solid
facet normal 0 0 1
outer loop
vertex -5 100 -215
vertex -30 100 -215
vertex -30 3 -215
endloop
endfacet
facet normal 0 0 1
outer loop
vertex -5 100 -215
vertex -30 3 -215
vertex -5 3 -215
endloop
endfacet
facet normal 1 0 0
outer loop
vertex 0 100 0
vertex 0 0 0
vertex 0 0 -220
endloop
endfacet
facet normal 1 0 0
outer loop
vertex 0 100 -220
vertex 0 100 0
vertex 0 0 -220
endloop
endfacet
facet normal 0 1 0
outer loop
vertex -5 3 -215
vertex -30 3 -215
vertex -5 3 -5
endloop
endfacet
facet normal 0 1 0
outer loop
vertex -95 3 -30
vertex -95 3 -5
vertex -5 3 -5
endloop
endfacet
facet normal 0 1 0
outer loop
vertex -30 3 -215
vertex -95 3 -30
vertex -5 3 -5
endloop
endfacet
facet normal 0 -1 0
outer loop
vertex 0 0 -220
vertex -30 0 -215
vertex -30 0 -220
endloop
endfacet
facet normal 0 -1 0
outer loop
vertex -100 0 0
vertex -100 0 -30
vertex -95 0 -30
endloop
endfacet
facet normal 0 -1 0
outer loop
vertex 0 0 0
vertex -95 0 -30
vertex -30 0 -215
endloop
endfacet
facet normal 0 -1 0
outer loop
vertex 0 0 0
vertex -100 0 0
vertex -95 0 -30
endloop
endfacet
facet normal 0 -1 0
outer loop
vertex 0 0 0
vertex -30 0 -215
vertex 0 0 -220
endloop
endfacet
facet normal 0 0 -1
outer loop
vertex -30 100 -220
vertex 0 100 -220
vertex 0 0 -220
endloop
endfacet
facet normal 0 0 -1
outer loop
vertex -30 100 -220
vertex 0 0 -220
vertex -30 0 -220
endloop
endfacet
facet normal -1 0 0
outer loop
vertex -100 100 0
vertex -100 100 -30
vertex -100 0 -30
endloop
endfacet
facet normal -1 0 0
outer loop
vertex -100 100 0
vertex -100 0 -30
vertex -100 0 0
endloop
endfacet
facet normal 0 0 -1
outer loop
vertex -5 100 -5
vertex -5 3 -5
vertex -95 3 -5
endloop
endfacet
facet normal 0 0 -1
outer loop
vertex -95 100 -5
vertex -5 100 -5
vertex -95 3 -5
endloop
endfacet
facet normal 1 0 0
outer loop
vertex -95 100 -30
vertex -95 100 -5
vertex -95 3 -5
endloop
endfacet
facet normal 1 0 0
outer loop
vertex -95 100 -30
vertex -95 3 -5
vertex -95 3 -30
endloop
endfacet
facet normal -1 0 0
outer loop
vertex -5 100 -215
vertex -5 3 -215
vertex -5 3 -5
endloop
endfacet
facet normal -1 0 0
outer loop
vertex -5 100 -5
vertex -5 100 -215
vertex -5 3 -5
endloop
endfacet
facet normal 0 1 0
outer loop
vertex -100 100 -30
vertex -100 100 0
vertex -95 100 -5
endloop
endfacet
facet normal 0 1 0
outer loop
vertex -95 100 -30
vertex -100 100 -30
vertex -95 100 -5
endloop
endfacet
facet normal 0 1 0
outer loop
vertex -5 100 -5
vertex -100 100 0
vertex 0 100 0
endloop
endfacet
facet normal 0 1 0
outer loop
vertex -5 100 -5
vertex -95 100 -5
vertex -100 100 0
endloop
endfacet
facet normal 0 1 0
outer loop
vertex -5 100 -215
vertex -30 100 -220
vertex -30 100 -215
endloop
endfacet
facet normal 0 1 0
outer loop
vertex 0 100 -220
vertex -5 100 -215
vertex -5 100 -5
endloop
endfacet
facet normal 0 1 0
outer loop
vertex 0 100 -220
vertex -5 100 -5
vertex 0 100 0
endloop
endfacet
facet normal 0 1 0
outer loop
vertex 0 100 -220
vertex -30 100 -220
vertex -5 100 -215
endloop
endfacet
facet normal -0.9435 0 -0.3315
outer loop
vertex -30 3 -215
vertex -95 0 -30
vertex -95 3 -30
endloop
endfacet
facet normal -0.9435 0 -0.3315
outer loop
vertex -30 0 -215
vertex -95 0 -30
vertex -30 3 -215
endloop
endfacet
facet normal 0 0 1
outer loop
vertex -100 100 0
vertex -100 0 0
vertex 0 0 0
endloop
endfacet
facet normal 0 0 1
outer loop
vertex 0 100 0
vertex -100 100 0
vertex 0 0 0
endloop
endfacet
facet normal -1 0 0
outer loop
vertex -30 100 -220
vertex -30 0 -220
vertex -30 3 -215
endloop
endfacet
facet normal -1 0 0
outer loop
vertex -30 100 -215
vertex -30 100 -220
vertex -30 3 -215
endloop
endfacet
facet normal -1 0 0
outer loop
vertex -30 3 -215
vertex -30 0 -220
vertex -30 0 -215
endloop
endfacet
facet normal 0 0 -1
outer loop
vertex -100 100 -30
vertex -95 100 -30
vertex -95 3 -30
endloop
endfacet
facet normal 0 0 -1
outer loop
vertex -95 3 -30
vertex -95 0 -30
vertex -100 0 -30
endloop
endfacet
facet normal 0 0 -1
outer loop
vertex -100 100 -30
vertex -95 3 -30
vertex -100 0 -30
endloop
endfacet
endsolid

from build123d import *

# Parameters (mm, degrees)
ESTRUSIONE_ESTRUSIONE1_DEPTH = 100
ESTRUSIONE_ESTRUSIONE2_DEPTH = 3


with BuildPart() as part:
    # Schizzo1 → Estrusione-Estrusione1 (new body)
    with BuildSketch(Plane(origin=(0, 0, 0), x_dir=(1, 0, 0), z_dir=(0, 1, 0))):
        Polygon((-100, 0), (0, 0), (0, 220), (-30, 220), (-30, 215), (-5, 215), (-5, 5), (-95, 5), (-95, 30), (-100, 30), align=None)
    extrude(amount=ESTRUSIONE_ESTRUSIONE1_DEPTH)

    # Schizzo2 → Estrusione-Estrusione2 (add)
    with BuildSketch(Plane.XZ):
        Polygon((-30, -215), (-5, -215), (-5, -5), (-95, -5), (-95, -30), align=None)
    extrude(amount=-ESTRUSIONE_ESTRUSIONE2_DEPTH)


solid = part.part
